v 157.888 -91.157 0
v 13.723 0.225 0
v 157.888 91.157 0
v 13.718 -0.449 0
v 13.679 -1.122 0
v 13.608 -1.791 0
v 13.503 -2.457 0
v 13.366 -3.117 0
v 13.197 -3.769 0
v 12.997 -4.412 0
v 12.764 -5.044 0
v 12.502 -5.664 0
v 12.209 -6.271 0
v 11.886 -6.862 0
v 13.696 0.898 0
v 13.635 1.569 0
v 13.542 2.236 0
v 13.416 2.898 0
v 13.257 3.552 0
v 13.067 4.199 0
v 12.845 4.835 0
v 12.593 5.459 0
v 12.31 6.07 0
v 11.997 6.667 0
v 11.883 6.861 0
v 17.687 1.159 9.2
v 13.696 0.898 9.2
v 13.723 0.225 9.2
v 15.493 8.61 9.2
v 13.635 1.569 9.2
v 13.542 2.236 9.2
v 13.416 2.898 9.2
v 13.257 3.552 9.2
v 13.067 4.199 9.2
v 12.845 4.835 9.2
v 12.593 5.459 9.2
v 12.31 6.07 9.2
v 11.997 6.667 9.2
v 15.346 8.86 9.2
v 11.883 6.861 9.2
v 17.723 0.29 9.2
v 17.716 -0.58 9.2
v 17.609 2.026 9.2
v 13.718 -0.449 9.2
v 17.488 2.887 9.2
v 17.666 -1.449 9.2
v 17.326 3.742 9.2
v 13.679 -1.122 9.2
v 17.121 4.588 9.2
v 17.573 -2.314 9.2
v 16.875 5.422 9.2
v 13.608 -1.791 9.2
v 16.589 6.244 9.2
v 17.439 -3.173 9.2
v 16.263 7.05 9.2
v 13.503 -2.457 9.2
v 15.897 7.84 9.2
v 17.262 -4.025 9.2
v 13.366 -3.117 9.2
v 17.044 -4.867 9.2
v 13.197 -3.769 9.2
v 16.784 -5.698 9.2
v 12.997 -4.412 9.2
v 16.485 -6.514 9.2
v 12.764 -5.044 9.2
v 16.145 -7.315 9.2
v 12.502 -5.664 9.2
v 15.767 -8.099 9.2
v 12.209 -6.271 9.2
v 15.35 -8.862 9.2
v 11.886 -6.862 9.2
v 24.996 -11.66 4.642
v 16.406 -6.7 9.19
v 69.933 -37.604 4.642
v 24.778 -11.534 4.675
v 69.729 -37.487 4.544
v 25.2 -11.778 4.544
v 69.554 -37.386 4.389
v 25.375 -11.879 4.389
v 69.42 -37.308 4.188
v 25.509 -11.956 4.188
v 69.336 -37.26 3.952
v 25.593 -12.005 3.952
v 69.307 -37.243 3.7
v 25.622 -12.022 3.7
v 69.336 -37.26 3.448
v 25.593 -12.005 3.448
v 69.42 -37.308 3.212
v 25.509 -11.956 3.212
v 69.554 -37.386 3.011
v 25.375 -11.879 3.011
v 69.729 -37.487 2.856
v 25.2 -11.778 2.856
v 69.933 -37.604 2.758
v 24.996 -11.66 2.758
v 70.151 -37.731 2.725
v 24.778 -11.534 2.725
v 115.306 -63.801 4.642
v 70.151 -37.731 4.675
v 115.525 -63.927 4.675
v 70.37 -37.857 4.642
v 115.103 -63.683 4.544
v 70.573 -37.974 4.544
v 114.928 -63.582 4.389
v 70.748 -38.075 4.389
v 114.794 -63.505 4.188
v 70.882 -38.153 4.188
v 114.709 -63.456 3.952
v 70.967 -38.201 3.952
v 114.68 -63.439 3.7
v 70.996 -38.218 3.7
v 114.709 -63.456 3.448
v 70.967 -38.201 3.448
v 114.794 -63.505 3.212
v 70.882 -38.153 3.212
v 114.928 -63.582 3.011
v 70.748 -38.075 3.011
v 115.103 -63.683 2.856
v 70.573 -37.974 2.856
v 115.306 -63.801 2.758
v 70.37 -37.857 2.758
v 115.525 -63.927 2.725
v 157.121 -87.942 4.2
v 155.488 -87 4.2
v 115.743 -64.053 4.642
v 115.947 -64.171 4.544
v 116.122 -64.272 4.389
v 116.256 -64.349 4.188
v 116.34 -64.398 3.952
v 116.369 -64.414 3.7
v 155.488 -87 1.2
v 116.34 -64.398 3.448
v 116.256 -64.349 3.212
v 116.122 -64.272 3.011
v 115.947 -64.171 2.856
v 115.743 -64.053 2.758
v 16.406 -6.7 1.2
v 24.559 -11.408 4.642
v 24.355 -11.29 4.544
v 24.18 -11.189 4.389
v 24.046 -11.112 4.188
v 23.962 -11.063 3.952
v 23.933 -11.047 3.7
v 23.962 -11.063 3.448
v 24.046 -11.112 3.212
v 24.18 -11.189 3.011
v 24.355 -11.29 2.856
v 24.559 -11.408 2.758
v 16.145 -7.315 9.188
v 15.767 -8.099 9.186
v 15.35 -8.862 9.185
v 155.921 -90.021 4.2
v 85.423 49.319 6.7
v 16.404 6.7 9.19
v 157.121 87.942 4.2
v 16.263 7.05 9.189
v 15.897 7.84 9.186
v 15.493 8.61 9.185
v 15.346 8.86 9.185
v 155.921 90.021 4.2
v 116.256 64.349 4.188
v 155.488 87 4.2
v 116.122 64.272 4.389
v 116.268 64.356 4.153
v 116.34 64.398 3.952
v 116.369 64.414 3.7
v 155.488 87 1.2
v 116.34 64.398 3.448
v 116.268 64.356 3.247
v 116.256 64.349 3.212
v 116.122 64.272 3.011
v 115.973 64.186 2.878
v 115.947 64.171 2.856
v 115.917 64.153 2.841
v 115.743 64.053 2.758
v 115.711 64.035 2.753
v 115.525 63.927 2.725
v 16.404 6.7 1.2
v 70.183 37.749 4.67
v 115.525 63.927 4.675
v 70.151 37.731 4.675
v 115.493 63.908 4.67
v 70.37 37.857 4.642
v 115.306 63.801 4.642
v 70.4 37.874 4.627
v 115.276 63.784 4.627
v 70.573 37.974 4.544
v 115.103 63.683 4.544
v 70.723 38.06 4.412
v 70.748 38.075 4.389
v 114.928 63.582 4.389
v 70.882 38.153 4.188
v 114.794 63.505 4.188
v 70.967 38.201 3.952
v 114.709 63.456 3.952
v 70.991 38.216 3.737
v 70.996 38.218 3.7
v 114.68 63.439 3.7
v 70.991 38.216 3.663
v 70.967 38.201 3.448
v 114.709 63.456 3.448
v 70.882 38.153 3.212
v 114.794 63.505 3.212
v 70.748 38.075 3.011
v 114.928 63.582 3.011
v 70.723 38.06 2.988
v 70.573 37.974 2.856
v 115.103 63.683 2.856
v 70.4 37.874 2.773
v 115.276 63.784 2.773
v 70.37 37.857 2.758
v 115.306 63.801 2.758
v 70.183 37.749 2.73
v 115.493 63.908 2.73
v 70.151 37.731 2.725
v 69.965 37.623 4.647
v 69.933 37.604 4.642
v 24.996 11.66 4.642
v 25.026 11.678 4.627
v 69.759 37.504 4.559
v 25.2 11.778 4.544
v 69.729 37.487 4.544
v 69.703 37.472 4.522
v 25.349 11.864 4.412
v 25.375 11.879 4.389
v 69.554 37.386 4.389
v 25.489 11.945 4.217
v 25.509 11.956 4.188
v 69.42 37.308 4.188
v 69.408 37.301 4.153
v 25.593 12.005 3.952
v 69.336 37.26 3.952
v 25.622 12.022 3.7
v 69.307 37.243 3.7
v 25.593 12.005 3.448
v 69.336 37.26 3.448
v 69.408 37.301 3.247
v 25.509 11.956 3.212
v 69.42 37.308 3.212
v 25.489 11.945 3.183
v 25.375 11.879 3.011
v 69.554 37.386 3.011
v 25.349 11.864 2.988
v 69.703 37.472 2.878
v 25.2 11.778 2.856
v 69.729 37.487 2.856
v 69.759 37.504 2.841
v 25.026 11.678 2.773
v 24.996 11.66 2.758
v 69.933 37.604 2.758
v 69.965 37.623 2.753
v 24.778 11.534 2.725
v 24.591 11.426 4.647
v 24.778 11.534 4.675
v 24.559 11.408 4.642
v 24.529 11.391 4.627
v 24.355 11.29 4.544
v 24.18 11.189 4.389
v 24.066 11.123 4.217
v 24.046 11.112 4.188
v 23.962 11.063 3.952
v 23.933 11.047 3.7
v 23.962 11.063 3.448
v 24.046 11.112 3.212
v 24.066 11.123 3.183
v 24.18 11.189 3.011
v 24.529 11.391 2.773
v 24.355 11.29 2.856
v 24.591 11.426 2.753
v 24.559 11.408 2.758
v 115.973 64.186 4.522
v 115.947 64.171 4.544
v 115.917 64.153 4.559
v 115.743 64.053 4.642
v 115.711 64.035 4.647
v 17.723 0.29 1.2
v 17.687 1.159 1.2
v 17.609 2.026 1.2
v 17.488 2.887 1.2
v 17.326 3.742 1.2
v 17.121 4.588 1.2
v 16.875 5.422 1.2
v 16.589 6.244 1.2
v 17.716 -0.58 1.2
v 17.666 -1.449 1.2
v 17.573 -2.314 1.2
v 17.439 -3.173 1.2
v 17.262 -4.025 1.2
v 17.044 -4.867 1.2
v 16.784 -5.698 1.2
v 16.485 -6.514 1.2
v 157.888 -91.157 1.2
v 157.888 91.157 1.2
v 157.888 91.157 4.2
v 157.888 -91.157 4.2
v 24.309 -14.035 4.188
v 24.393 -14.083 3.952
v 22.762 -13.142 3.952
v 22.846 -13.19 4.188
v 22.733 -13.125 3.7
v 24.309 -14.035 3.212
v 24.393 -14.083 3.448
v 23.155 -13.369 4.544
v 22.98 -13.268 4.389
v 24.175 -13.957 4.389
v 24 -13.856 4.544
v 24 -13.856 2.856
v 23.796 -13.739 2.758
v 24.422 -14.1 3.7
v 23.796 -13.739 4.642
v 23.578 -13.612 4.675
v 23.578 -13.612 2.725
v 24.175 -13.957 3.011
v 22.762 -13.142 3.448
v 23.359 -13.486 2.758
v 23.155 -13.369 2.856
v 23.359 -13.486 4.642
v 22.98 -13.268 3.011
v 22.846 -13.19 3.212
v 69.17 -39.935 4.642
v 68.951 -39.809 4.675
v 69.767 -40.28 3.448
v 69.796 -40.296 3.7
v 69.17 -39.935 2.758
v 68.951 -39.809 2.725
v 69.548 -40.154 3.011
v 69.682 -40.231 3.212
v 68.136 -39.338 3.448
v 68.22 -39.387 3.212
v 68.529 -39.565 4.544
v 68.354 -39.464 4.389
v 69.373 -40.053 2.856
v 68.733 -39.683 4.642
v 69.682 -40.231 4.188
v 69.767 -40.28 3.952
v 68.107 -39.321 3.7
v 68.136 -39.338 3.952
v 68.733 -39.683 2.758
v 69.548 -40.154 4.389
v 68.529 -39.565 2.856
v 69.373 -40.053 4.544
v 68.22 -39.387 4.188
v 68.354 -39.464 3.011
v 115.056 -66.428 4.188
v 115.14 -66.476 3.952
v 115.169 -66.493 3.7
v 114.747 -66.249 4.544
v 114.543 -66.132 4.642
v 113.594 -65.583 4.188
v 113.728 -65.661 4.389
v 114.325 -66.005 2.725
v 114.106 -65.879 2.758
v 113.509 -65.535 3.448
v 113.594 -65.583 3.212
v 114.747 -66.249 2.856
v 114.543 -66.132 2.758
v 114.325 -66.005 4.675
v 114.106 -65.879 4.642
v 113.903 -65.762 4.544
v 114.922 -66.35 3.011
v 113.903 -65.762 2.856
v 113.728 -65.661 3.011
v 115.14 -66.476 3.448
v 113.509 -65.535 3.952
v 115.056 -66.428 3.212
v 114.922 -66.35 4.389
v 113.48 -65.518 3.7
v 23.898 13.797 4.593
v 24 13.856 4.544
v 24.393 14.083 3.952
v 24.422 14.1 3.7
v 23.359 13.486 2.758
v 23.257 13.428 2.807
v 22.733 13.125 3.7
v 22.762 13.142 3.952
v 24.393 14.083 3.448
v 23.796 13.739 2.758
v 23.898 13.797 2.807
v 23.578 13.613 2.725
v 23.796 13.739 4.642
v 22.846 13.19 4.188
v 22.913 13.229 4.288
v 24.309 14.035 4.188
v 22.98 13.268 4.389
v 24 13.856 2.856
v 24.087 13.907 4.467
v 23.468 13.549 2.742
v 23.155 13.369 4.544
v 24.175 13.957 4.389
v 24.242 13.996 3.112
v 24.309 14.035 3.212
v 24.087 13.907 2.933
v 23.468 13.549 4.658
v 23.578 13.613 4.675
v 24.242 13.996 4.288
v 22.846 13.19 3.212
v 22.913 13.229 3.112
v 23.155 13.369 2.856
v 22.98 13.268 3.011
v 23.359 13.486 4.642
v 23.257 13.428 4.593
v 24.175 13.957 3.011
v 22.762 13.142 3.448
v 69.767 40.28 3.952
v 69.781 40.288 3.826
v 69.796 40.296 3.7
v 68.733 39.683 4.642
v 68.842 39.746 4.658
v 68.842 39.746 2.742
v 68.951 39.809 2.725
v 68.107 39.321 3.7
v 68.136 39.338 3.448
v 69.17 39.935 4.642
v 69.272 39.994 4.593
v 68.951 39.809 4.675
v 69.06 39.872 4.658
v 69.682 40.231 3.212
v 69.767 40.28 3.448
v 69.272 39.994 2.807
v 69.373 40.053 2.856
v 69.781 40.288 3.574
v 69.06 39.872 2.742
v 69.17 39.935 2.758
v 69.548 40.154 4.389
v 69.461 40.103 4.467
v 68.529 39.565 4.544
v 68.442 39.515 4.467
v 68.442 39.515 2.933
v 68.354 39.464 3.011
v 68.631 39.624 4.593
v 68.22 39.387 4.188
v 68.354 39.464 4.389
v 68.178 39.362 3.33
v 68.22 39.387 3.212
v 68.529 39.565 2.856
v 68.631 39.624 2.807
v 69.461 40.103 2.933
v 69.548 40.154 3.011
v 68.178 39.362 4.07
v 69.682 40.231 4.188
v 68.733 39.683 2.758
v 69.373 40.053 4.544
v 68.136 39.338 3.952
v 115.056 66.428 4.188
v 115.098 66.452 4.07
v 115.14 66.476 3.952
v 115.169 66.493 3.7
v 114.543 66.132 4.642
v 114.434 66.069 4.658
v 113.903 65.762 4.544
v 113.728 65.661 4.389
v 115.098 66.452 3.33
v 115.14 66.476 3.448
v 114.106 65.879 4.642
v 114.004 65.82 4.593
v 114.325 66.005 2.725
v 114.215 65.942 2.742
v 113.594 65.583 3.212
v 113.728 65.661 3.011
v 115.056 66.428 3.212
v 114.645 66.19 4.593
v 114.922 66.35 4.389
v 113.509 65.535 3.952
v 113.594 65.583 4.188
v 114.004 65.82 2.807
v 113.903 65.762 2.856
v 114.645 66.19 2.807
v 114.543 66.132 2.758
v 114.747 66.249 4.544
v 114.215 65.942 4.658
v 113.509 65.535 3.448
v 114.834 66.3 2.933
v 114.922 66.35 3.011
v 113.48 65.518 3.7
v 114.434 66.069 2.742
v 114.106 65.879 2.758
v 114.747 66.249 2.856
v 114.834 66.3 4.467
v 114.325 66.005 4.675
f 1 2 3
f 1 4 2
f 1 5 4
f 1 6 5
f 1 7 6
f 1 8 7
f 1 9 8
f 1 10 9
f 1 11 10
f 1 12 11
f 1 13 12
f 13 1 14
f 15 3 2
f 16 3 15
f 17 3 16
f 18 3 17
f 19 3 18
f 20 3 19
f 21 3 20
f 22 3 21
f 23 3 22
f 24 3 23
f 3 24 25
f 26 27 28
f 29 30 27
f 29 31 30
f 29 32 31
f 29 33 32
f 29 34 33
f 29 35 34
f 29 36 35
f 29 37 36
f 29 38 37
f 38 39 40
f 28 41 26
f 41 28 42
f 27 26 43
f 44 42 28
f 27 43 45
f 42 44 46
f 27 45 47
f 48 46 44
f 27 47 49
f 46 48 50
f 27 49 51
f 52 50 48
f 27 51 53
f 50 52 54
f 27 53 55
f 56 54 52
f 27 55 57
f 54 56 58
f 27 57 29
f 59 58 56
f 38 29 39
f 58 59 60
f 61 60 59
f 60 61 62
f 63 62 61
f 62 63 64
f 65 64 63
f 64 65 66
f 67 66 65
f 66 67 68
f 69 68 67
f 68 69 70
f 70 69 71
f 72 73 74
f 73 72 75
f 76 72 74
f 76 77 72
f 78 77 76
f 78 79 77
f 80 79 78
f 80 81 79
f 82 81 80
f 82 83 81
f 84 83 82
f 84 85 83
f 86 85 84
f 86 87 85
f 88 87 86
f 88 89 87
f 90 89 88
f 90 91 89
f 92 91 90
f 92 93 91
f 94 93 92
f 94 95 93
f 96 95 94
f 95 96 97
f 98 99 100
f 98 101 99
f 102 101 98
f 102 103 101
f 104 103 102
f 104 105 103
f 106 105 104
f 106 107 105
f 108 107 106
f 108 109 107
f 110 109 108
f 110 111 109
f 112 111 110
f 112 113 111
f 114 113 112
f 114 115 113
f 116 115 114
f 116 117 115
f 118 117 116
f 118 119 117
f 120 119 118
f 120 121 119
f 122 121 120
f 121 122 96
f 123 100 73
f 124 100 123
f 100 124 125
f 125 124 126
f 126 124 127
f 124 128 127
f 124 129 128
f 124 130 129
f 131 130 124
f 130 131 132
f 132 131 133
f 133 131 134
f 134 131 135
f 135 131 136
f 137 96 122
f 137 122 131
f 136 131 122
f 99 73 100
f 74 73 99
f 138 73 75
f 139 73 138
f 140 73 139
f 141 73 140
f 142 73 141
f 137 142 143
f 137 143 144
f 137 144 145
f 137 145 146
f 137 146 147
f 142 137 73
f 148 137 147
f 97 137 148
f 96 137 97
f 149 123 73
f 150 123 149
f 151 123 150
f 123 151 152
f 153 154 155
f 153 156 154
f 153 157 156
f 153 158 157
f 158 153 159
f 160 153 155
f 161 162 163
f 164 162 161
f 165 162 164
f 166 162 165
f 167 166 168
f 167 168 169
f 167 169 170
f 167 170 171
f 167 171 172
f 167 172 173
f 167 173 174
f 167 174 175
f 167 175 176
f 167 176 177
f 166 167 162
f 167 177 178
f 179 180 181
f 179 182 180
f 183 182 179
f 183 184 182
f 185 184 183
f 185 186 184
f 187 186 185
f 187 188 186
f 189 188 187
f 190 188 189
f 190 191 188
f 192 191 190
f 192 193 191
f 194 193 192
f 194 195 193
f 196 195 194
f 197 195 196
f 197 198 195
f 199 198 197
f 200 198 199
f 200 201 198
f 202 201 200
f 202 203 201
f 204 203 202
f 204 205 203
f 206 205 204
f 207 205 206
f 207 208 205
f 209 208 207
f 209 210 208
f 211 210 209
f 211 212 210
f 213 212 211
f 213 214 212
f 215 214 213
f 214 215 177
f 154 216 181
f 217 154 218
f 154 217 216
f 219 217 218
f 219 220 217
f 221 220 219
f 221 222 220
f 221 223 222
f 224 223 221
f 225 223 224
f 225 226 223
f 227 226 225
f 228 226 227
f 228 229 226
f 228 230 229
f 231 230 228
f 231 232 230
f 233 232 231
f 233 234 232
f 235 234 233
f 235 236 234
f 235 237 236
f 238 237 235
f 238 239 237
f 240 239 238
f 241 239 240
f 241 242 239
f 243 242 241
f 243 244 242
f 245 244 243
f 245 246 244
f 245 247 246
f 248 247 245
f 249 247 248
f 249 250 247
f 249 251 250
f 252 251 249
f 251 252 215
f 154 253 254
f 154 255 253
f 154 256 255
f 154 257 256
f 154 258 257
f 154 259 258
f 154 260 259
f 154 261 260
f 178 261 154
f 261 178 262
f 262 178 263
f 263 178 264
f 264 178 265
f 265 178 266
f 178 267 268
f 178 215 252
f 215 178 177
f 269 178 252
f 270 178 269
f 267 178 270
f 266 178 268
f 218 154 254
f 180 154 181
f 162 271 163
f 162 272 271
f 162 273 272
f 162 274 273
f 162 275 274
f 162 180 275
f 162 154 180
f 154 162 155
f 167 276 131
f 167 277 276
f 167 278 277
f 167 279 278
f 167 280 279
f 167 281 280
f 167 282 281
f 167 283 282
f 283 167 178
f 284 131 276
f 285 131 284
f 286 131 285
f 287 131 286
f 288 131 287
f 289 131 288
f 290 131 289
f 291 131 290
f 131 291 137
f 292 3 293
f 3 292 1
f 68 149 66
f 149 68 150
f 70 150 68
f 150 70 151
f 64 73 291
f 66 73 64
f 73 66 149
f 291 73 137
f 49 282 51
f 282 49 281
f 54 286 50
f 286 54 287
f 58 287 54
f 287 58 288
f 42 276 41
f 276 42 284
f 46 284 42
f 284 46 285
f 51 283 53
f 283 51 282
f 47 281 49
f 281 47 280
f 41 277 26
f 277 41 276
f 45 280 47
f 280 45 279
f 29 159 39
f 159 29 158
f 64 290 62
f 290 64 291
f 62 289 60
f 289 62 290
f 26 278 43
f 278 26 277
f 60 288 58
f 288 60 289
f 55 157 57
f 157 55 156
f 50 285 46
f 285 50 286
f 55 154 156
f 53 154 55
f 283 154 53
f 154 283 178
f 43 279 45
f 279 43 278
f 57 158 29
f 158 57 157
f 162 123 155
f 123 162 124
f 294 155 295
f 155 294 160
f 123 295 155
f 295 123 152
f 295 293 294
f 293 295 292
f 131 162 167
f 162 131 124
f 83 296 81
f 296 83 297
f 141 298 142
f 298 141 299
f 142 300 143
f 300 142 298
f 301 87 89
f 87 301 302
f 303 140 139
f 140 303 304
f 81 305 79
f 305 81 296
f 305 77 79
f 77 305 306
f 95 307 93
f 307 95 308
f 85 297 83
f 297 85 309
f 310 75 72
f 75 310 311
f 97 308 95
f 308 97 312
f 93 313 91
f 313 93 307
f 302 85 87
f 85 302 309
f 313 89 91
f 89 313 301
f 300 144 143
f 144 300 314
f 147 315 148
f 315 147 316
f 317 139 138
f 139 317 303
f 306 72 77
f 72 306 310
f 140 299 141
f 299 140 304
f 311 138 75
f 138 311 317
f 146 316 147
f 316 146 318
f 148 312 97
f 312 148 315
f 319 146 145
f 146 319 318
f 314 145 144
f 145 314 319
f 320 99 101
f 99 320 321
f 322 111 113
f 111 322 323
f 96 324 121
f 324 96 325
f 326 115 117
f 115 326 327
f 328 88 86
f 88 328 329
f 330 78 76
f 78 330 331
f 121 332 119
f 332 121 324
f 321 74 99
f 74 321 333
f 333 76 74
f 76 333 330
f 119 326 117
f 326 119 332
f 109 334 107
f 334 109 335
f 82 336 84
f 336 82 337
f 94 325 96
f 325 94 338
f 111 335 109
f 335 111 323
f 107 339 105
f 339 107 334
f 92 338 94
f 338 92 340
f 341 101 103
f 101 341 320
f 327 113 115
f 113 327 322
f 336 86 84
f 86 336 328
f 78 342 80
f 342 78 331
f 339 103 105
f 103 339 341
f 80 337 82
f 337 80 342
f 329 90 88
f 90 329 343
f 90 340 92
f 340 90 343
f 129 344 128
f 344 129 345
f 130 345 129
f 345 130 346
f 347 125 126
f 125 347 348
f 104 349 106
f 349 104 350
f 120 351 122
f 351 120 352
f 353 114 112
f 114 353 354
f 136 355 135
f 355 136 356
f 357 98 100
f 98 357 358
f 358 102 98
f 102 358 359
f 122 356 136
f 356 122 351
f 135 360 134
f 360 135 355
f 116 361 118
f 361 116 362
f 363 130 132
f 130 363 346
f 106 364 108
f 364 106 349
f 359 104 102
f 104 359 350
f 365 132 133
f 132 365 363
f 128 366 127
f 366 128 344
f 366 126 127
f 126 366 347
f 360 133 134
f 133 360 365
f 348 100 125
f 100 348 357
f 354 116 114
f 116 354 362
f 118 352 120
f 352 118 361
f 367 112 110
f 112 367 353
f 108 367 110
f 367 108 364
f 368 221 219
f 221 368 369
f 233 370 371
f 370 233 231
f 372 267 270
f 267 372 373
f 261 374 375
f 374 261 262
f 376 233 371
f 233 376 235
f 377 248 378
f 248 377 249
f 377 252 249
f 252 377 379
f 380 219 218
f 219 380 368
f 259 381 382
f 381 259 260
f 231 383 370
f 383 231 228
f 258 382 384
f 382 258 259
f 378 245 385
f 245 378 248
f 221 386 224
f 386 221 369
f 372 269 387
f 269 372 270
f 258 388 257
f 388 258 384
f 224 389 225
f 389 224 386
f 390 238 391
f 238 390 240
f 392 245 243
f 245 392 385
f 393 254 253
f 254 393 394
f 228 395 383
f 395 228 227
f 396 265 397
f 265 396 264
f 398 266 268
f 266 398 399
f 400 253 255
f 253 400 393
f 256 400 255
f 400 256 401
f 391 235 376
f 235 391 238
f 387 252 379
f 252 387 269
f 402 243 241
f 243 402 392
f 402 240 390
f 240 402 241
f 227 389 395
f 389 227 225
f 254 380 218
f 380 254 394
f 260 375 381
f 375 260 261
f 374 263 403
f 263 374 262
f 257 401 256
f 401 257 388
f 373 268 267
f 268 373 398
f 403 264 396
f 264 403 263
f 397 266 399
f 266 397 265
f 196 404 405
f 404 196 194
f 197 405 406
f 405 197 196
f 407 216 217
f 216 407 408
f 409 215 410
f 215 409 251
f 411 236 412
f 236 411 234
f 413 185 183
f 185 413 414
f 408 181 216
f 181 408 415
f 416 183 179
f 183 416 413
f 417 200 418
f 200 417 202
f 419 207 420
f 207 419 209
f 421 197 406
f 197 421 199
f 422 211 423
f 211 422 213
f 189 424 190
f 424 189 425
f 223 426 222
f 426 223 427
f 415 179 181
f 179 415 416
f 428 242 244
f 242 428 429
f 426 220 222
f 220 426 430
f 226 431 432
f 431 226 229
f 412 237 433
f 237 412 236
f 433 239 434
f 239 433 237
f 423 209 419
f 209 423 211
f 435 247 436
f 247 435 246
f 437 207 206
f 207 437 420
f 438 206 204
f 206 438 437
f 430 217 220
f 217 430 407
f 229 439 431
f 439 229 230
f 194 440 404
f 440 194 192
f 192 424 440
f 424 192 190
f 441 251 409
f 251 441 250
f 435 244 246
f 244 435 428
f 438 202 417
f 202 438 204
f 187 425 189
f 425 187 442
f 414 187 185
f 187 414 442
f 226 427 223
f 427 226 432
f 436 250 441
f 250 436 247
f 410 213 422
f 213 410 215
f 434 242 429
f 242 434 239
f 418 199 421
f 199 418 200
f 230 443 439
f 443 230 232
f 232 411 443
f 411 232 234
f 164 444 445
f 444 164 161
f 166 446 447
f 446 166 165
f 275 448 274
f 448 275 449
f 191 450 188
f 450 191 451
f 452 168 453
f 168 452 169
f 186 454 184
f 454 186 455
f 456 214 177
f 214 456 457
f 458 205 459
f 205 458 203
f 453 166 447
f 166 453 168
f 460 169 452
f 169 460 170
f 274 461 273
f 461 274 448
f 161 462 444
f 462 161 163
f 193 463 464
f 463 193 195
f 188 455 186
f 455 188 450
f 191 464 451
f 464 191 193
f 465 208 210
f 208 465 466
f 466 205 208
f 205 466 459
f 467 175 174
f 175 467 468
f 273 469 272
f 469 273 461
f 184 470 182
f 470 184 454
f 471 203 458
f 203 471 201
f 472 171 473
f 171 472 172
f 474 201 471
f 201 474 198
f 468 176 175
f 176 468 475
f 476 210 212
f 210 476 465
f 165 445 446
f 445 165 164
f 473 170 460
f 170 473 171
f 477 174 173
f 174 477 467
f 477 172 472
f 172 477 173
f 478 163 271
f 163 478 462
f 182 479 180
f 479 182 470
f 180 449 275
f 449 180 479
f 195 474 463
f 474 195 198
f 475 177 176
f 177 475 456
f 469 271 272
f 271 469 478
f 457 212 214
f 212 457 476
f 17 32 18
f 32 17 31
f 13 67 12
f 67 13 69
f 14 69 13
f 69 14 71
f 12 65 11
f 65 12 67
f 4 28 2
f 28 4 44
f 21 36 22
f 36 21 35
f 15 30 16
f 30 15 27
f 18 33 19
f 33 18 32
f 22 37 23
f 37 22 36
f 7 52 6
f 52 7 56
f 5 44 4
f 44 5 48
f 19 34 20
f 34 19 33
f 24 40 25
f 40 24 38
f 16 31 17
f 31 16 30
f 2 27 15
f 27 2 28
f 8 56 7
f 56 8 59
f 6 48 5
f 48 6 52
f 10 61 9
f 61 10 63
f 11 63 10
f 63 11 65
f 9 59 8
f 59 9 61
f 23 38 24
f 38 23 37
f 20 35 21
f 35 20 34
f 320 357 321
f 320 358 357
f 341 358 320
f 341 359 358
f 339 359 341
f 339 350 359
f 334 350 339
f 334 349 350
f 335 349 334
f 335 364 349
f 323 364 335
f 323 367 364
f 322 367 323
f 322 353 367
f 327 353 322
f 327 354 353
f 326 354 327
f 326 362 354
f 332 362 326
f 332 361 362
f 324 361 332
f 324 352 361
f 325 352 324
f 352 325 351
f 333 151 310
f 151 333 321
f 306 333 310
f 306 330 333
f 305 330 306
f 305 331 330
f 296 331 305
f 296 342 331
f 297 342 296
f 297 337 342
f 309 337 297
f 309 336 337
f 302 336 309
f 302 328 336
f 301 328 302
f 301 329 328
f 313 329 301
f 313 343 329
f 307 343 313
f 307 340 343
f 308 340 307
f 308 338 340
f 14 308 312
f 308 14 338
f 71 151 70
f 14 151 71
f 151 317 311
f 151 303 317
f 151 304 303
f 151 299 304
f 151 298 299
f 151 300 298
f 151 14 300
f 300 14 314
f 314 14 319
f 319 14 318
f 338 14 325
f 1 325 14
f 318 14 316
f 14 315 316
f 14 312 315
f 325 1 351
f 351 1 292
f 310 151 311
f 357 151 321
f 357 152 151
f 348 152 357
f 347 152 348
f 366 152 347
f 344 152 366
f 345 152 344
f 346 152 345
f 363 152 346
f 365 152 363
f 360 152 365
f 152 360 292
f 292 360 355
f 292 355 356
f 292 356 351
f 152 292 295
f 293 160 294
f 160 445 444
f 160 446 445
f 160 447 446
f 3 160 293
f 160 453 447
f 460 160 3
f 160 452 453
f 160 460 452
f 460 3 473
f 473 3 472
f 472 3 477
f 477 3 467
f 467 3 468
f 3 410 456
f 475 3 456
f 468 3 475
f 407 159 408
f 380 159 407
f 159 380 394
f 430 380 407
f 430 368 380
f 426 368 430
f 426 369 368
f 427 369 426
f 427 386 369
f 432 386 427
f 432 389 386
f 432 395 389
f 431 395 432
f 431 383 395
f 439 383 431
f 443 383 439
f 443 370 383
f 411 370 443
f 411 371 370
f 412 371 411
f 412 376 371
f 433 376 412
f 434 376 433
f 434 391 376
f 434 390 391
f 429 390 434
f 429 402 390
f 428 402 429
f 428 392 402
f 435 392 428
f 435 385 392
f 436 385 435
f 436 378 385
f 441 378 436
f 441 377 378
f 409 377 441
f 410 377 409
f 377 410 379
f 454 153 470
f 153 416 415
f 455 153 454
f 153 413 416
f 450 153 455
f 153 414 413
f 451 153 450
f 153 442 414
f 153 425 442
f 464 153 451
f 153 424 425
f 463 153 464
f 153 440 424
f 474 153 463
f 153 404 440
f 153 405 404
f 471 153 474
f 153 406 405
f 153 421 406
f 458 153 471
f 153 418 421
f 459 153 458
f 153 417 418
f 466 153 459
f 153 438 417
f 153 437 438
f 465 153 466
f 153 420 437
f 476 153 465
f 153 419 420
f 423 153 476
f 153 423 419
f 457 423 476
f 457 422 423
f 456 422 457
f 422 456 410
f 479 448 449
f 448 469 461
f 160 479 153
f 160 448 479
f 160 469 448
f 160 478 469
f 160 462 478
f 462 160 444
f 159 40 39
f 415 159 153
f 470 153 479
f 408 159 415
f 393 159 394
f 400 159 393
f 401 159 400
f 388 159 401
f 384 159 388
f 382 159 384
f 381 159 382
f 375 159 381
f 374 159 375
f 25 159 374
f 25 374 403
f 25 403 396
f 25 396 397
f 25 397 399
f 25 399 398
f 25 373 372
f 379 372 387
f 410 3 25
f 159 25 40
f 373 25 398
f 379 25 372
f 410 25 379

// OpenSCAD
// file: params.scad
// Shared dimensions for the E27 pendant light diffuser.
// Both parts include this file so the disc's hole always matches the plug.
// All units are millimetres.

/* [E27 thread] */
// E27 (Edison) thread: IEC 60061-1 nominal male dimensions.
e27_major_d = 26.45;     // outside diameter of thread crests
e27_minor_d = 24.26;     // diameter at thread roots
e27_pitch   = 25.4 / 7;  // 7 threads per inch = 3.629 mm
// Shrink the thread slightly so a printed part turns freely in a metal shell.
thread_clearance = 0.3;  // subtracted from the diameter
thread_length    = 20;   // length of threaded section
lead_in          = 1.5;  // chamfer at the flat end to help start the thread

/* [Plug body] */
hollow        = true;    // hollow out the plug to save material
wall          = 2.4;     // wall thickness when hollow
end_cap       = 2.0;     // solid thickness of the flat end

/* [Collar (the ledge the disc sits on)] */
collar_d      = 36;      // must be larger than disc_hole_d
collar_h      = 3;       // flat part of the collar
collar_chamfer = 3;      // 45° underside chamfer so it prints without supports

/* [Grip] */
grip_d        = 32;
grip_h        = 14;
grip_flutes   = 12;      // number of finger scallops
grip_flute_d  = 6;

/* [Splitter and bulbs] */
// Designed for a DiCUNO 7-in-1 splitter: the plug screws into the centre
// socket (pointing down), and the six gooseneck arms are bent so their BR30
// bulbs point up above the disc. The arms bend, so measure your setup.
br30_d          = 95.25; // BR30 = 30/8" = 3.75" across the face
bulb_ring_r     = 110;   // distance from the splitter's axis to each bulb's centre
                         // (six BR30s touch at 95.25; leave a little air)
cover_margin    = 15;    // extra disc beyond the bulbs' outer edge, so they stay
                         // hidden when seen from an angle below

/* [Disc] */
disc_d          = 2 * (bulb_ring_r + br30_d / 2 + cover_margin);
disc_t          = 1.2;   // very thin so light passes through
disc_hole_clearance = 1.0;
disc_hole_d     = e27_major_d + disc_hole_clearance;
spokes          = 6;
spoke_w         = 2.4;   // a seam rib is two of these, one on each segment
spoke_h_inner   = 8;     // rib height at the hub (above the disc)
spoke_h_outer   = 3;     // rib height at the rim
hub_w           = 4;     // width of the reinforcing ring around the hole
rim_w           = 2.4;   // width of the reinforcing ring at the edge (0 = none)
rim_h           = 3;

/* [Hexagon] */
// The hexagon's corners point at the bulbs, so it needs less area than a
// circle to hide them. Size it so each bulb (plus margin) fits inside the
// two edges beside its corner.
hex_apothem     = bulb_ring_r * cos(30) + br30_d / 2 + cover_margin;
hex_r           = hex_apothem / cos(30);   // centre-to-corner radius

/* [Segmenting] */
// The disc is too big for most printers, so it's printed as identical wedges
// joined along the ribs. Segments must divide evenly into spokes.
segments        = 6;
pin_d           = 1.75;  // 1.75 mm filament works as alignment pins
pin_hole_d      = 1.95;
pin_count       = 3;     // pins per seam
bed_size        = 220;   // warn if a segment won't fit a square bed this size

$fn = 128;
// file: diffuser_lib.scad
// Shared geometry for the diffuser, in two shapes: "circle" and "hex".
//
// A thin plate with radial ribs on one side for stiffness. The hole lets the
// plug's thread pass through; the plate rests on the plug's collar.
// Print flat side down, ribs up. When hanging, the ribs face up toward the bulbs.
//
// The hexagon's corners sit at 0°, 60°, ... so the ribs run out to its corners.

include <params.scad>

hub_out_d = disc_hole_d + 2 * hub_w;
rib_r_in  = hub_out_d / 2 - 0.5;
pin_z     = disc_t + 2.5;

// Centre-to-farthest-point radius of each shape.
function outer_r(shape) = shape == "hex" ? hex_r : disc_d / 2;

// Where a rib meets the inside of the rim.
function rib_r_out(shape) =
    shape == "hex" ? hex_r - (rim_w > 0 ? rim_w / cos(30) - 0.5 : 0)
                   : disc_d / 2 - (rim_w > 0 ? rim_w - 0.5 : 0);

// Pins go only where the rib is tall enough to surround the hole.
function pin_radii(shape) =
    let (r_out = rib_r_out(shape),
         r_min = rib_r_in + 10,
         r_max = rib_r_in + (r_out - rib_r_in)
               * (spoke_h_inner - (pin_z - disc_t + pin_hole_d / 2 + 1))
               / (spoke_h_inner - spoke_h_outer))
    [for (i = [0 : pin_count - 1])
         r_min + (r_max - r_min) * i / max(pin_count - 1, 1)];

function is_seam(i) = segments > 1 && (i * segments) % spokes == 0;

module outline(shape) {
    if (shape == "hex") circle(r = hex_r, $fn = 6);
    else                circle(d = disc_d, $fn = 360);
}

module rib(w, r_out) {
    hull() {
        translate([rib_r_in, -w / 2, 0])
            cube([0.01, w, disc_t + spoke_h_inner]);
        translate([r_out - 0.01, -w / 2, 0])
            cube([0.01, w, disc_t + spoke_h_outer]);
    }
}

module diffuser(shape = "circle") {
    assert(shape == "circle" || shape == "hex", "shape must be \"circle\" or \"hex\"");
    assert(spokes % segments == 0, "segments must divide evenly into spokes");
    difference() {
        union() {
            linear_extrude(height = disc_t) outline(shape);
            cylinder(d = hub_out_d, h = disc_t + spoke_h_inner);
            if (rim_w > 0)
                linear_extrude(height = disc_t + rim_h)
                    difference() {
                        outline(shape);
                        offset(delta = -rim_w) outline(shape);
                    }
            for (i = [0 : spokes - 1])
                rotate([0, 0, i * 360 / spokes])
                    rib(is_seam(i) ? 2 * spoke_w : spoke_w, rib_r_out(shape));
        }
        translate([0, 0, -1])
            cylinder(d = disc_hole_d, h = disc_t + spoke_h_inner + 2);
        // Alignment pin holes straight through each seam rib.
        for (i = [0 : spokes - 1])
            if (is_seam(i))
                for (r = pin_radii(shape))
                    rotate([0, 0, i * 360 / spokes])
                        translate([r, 0, pin_z])
                            rotate([90, 0, 0])
                                cylinder(d = pin_hole_d, h = 2 * spoke_w + 2,
                                         center = true, $fn = 24);
    }
}

// One wedge, lying between angle 0 and 360/segments.
module diffuser_wedge(shape = "circle") {
    a = 360 / segments;
    big = 2 * outer_r(shape);
    intersection() {
        diffuser(shape);
        translate([0, 0, -1])
            linear_extrude(height = disc_t + spoke_h_inner + 2)
                polygon(concat([[0, 0]],
                               [for (t = [0 : a / 16 : a]) big * [cos(t), sin(t)]]));
    }
}

// A wedge turned to point along +X, with a size report and bed-fit warning.
module printable_wedge(shape = "circle") {
    r = outer_r(shape);
    a = 360 / segments;
    width = 2 * r * sin(min(a, 180) / 2);
    echo(str(shape, ": ", round(2 * r), " mm across; segment about ",
             round(r), " x ", round(width), " mm"));
    if (max(r, width) > bed_size)
        echo(str("WARNING: segment may not fit a ", bed_size,
                 " mm bed — increase segments"));
    rotate([0, 0, -a / 2]) diffuser_wedge(shape);
}
// main file
// One wedge of the hexagonal diffuser: an equilateral triangle. Print
// `segments` copies (6 by default) and join them along the ribs with
// filament pins and glue.

use <diffuser_lib.scad>

printable_wedge("hex");
